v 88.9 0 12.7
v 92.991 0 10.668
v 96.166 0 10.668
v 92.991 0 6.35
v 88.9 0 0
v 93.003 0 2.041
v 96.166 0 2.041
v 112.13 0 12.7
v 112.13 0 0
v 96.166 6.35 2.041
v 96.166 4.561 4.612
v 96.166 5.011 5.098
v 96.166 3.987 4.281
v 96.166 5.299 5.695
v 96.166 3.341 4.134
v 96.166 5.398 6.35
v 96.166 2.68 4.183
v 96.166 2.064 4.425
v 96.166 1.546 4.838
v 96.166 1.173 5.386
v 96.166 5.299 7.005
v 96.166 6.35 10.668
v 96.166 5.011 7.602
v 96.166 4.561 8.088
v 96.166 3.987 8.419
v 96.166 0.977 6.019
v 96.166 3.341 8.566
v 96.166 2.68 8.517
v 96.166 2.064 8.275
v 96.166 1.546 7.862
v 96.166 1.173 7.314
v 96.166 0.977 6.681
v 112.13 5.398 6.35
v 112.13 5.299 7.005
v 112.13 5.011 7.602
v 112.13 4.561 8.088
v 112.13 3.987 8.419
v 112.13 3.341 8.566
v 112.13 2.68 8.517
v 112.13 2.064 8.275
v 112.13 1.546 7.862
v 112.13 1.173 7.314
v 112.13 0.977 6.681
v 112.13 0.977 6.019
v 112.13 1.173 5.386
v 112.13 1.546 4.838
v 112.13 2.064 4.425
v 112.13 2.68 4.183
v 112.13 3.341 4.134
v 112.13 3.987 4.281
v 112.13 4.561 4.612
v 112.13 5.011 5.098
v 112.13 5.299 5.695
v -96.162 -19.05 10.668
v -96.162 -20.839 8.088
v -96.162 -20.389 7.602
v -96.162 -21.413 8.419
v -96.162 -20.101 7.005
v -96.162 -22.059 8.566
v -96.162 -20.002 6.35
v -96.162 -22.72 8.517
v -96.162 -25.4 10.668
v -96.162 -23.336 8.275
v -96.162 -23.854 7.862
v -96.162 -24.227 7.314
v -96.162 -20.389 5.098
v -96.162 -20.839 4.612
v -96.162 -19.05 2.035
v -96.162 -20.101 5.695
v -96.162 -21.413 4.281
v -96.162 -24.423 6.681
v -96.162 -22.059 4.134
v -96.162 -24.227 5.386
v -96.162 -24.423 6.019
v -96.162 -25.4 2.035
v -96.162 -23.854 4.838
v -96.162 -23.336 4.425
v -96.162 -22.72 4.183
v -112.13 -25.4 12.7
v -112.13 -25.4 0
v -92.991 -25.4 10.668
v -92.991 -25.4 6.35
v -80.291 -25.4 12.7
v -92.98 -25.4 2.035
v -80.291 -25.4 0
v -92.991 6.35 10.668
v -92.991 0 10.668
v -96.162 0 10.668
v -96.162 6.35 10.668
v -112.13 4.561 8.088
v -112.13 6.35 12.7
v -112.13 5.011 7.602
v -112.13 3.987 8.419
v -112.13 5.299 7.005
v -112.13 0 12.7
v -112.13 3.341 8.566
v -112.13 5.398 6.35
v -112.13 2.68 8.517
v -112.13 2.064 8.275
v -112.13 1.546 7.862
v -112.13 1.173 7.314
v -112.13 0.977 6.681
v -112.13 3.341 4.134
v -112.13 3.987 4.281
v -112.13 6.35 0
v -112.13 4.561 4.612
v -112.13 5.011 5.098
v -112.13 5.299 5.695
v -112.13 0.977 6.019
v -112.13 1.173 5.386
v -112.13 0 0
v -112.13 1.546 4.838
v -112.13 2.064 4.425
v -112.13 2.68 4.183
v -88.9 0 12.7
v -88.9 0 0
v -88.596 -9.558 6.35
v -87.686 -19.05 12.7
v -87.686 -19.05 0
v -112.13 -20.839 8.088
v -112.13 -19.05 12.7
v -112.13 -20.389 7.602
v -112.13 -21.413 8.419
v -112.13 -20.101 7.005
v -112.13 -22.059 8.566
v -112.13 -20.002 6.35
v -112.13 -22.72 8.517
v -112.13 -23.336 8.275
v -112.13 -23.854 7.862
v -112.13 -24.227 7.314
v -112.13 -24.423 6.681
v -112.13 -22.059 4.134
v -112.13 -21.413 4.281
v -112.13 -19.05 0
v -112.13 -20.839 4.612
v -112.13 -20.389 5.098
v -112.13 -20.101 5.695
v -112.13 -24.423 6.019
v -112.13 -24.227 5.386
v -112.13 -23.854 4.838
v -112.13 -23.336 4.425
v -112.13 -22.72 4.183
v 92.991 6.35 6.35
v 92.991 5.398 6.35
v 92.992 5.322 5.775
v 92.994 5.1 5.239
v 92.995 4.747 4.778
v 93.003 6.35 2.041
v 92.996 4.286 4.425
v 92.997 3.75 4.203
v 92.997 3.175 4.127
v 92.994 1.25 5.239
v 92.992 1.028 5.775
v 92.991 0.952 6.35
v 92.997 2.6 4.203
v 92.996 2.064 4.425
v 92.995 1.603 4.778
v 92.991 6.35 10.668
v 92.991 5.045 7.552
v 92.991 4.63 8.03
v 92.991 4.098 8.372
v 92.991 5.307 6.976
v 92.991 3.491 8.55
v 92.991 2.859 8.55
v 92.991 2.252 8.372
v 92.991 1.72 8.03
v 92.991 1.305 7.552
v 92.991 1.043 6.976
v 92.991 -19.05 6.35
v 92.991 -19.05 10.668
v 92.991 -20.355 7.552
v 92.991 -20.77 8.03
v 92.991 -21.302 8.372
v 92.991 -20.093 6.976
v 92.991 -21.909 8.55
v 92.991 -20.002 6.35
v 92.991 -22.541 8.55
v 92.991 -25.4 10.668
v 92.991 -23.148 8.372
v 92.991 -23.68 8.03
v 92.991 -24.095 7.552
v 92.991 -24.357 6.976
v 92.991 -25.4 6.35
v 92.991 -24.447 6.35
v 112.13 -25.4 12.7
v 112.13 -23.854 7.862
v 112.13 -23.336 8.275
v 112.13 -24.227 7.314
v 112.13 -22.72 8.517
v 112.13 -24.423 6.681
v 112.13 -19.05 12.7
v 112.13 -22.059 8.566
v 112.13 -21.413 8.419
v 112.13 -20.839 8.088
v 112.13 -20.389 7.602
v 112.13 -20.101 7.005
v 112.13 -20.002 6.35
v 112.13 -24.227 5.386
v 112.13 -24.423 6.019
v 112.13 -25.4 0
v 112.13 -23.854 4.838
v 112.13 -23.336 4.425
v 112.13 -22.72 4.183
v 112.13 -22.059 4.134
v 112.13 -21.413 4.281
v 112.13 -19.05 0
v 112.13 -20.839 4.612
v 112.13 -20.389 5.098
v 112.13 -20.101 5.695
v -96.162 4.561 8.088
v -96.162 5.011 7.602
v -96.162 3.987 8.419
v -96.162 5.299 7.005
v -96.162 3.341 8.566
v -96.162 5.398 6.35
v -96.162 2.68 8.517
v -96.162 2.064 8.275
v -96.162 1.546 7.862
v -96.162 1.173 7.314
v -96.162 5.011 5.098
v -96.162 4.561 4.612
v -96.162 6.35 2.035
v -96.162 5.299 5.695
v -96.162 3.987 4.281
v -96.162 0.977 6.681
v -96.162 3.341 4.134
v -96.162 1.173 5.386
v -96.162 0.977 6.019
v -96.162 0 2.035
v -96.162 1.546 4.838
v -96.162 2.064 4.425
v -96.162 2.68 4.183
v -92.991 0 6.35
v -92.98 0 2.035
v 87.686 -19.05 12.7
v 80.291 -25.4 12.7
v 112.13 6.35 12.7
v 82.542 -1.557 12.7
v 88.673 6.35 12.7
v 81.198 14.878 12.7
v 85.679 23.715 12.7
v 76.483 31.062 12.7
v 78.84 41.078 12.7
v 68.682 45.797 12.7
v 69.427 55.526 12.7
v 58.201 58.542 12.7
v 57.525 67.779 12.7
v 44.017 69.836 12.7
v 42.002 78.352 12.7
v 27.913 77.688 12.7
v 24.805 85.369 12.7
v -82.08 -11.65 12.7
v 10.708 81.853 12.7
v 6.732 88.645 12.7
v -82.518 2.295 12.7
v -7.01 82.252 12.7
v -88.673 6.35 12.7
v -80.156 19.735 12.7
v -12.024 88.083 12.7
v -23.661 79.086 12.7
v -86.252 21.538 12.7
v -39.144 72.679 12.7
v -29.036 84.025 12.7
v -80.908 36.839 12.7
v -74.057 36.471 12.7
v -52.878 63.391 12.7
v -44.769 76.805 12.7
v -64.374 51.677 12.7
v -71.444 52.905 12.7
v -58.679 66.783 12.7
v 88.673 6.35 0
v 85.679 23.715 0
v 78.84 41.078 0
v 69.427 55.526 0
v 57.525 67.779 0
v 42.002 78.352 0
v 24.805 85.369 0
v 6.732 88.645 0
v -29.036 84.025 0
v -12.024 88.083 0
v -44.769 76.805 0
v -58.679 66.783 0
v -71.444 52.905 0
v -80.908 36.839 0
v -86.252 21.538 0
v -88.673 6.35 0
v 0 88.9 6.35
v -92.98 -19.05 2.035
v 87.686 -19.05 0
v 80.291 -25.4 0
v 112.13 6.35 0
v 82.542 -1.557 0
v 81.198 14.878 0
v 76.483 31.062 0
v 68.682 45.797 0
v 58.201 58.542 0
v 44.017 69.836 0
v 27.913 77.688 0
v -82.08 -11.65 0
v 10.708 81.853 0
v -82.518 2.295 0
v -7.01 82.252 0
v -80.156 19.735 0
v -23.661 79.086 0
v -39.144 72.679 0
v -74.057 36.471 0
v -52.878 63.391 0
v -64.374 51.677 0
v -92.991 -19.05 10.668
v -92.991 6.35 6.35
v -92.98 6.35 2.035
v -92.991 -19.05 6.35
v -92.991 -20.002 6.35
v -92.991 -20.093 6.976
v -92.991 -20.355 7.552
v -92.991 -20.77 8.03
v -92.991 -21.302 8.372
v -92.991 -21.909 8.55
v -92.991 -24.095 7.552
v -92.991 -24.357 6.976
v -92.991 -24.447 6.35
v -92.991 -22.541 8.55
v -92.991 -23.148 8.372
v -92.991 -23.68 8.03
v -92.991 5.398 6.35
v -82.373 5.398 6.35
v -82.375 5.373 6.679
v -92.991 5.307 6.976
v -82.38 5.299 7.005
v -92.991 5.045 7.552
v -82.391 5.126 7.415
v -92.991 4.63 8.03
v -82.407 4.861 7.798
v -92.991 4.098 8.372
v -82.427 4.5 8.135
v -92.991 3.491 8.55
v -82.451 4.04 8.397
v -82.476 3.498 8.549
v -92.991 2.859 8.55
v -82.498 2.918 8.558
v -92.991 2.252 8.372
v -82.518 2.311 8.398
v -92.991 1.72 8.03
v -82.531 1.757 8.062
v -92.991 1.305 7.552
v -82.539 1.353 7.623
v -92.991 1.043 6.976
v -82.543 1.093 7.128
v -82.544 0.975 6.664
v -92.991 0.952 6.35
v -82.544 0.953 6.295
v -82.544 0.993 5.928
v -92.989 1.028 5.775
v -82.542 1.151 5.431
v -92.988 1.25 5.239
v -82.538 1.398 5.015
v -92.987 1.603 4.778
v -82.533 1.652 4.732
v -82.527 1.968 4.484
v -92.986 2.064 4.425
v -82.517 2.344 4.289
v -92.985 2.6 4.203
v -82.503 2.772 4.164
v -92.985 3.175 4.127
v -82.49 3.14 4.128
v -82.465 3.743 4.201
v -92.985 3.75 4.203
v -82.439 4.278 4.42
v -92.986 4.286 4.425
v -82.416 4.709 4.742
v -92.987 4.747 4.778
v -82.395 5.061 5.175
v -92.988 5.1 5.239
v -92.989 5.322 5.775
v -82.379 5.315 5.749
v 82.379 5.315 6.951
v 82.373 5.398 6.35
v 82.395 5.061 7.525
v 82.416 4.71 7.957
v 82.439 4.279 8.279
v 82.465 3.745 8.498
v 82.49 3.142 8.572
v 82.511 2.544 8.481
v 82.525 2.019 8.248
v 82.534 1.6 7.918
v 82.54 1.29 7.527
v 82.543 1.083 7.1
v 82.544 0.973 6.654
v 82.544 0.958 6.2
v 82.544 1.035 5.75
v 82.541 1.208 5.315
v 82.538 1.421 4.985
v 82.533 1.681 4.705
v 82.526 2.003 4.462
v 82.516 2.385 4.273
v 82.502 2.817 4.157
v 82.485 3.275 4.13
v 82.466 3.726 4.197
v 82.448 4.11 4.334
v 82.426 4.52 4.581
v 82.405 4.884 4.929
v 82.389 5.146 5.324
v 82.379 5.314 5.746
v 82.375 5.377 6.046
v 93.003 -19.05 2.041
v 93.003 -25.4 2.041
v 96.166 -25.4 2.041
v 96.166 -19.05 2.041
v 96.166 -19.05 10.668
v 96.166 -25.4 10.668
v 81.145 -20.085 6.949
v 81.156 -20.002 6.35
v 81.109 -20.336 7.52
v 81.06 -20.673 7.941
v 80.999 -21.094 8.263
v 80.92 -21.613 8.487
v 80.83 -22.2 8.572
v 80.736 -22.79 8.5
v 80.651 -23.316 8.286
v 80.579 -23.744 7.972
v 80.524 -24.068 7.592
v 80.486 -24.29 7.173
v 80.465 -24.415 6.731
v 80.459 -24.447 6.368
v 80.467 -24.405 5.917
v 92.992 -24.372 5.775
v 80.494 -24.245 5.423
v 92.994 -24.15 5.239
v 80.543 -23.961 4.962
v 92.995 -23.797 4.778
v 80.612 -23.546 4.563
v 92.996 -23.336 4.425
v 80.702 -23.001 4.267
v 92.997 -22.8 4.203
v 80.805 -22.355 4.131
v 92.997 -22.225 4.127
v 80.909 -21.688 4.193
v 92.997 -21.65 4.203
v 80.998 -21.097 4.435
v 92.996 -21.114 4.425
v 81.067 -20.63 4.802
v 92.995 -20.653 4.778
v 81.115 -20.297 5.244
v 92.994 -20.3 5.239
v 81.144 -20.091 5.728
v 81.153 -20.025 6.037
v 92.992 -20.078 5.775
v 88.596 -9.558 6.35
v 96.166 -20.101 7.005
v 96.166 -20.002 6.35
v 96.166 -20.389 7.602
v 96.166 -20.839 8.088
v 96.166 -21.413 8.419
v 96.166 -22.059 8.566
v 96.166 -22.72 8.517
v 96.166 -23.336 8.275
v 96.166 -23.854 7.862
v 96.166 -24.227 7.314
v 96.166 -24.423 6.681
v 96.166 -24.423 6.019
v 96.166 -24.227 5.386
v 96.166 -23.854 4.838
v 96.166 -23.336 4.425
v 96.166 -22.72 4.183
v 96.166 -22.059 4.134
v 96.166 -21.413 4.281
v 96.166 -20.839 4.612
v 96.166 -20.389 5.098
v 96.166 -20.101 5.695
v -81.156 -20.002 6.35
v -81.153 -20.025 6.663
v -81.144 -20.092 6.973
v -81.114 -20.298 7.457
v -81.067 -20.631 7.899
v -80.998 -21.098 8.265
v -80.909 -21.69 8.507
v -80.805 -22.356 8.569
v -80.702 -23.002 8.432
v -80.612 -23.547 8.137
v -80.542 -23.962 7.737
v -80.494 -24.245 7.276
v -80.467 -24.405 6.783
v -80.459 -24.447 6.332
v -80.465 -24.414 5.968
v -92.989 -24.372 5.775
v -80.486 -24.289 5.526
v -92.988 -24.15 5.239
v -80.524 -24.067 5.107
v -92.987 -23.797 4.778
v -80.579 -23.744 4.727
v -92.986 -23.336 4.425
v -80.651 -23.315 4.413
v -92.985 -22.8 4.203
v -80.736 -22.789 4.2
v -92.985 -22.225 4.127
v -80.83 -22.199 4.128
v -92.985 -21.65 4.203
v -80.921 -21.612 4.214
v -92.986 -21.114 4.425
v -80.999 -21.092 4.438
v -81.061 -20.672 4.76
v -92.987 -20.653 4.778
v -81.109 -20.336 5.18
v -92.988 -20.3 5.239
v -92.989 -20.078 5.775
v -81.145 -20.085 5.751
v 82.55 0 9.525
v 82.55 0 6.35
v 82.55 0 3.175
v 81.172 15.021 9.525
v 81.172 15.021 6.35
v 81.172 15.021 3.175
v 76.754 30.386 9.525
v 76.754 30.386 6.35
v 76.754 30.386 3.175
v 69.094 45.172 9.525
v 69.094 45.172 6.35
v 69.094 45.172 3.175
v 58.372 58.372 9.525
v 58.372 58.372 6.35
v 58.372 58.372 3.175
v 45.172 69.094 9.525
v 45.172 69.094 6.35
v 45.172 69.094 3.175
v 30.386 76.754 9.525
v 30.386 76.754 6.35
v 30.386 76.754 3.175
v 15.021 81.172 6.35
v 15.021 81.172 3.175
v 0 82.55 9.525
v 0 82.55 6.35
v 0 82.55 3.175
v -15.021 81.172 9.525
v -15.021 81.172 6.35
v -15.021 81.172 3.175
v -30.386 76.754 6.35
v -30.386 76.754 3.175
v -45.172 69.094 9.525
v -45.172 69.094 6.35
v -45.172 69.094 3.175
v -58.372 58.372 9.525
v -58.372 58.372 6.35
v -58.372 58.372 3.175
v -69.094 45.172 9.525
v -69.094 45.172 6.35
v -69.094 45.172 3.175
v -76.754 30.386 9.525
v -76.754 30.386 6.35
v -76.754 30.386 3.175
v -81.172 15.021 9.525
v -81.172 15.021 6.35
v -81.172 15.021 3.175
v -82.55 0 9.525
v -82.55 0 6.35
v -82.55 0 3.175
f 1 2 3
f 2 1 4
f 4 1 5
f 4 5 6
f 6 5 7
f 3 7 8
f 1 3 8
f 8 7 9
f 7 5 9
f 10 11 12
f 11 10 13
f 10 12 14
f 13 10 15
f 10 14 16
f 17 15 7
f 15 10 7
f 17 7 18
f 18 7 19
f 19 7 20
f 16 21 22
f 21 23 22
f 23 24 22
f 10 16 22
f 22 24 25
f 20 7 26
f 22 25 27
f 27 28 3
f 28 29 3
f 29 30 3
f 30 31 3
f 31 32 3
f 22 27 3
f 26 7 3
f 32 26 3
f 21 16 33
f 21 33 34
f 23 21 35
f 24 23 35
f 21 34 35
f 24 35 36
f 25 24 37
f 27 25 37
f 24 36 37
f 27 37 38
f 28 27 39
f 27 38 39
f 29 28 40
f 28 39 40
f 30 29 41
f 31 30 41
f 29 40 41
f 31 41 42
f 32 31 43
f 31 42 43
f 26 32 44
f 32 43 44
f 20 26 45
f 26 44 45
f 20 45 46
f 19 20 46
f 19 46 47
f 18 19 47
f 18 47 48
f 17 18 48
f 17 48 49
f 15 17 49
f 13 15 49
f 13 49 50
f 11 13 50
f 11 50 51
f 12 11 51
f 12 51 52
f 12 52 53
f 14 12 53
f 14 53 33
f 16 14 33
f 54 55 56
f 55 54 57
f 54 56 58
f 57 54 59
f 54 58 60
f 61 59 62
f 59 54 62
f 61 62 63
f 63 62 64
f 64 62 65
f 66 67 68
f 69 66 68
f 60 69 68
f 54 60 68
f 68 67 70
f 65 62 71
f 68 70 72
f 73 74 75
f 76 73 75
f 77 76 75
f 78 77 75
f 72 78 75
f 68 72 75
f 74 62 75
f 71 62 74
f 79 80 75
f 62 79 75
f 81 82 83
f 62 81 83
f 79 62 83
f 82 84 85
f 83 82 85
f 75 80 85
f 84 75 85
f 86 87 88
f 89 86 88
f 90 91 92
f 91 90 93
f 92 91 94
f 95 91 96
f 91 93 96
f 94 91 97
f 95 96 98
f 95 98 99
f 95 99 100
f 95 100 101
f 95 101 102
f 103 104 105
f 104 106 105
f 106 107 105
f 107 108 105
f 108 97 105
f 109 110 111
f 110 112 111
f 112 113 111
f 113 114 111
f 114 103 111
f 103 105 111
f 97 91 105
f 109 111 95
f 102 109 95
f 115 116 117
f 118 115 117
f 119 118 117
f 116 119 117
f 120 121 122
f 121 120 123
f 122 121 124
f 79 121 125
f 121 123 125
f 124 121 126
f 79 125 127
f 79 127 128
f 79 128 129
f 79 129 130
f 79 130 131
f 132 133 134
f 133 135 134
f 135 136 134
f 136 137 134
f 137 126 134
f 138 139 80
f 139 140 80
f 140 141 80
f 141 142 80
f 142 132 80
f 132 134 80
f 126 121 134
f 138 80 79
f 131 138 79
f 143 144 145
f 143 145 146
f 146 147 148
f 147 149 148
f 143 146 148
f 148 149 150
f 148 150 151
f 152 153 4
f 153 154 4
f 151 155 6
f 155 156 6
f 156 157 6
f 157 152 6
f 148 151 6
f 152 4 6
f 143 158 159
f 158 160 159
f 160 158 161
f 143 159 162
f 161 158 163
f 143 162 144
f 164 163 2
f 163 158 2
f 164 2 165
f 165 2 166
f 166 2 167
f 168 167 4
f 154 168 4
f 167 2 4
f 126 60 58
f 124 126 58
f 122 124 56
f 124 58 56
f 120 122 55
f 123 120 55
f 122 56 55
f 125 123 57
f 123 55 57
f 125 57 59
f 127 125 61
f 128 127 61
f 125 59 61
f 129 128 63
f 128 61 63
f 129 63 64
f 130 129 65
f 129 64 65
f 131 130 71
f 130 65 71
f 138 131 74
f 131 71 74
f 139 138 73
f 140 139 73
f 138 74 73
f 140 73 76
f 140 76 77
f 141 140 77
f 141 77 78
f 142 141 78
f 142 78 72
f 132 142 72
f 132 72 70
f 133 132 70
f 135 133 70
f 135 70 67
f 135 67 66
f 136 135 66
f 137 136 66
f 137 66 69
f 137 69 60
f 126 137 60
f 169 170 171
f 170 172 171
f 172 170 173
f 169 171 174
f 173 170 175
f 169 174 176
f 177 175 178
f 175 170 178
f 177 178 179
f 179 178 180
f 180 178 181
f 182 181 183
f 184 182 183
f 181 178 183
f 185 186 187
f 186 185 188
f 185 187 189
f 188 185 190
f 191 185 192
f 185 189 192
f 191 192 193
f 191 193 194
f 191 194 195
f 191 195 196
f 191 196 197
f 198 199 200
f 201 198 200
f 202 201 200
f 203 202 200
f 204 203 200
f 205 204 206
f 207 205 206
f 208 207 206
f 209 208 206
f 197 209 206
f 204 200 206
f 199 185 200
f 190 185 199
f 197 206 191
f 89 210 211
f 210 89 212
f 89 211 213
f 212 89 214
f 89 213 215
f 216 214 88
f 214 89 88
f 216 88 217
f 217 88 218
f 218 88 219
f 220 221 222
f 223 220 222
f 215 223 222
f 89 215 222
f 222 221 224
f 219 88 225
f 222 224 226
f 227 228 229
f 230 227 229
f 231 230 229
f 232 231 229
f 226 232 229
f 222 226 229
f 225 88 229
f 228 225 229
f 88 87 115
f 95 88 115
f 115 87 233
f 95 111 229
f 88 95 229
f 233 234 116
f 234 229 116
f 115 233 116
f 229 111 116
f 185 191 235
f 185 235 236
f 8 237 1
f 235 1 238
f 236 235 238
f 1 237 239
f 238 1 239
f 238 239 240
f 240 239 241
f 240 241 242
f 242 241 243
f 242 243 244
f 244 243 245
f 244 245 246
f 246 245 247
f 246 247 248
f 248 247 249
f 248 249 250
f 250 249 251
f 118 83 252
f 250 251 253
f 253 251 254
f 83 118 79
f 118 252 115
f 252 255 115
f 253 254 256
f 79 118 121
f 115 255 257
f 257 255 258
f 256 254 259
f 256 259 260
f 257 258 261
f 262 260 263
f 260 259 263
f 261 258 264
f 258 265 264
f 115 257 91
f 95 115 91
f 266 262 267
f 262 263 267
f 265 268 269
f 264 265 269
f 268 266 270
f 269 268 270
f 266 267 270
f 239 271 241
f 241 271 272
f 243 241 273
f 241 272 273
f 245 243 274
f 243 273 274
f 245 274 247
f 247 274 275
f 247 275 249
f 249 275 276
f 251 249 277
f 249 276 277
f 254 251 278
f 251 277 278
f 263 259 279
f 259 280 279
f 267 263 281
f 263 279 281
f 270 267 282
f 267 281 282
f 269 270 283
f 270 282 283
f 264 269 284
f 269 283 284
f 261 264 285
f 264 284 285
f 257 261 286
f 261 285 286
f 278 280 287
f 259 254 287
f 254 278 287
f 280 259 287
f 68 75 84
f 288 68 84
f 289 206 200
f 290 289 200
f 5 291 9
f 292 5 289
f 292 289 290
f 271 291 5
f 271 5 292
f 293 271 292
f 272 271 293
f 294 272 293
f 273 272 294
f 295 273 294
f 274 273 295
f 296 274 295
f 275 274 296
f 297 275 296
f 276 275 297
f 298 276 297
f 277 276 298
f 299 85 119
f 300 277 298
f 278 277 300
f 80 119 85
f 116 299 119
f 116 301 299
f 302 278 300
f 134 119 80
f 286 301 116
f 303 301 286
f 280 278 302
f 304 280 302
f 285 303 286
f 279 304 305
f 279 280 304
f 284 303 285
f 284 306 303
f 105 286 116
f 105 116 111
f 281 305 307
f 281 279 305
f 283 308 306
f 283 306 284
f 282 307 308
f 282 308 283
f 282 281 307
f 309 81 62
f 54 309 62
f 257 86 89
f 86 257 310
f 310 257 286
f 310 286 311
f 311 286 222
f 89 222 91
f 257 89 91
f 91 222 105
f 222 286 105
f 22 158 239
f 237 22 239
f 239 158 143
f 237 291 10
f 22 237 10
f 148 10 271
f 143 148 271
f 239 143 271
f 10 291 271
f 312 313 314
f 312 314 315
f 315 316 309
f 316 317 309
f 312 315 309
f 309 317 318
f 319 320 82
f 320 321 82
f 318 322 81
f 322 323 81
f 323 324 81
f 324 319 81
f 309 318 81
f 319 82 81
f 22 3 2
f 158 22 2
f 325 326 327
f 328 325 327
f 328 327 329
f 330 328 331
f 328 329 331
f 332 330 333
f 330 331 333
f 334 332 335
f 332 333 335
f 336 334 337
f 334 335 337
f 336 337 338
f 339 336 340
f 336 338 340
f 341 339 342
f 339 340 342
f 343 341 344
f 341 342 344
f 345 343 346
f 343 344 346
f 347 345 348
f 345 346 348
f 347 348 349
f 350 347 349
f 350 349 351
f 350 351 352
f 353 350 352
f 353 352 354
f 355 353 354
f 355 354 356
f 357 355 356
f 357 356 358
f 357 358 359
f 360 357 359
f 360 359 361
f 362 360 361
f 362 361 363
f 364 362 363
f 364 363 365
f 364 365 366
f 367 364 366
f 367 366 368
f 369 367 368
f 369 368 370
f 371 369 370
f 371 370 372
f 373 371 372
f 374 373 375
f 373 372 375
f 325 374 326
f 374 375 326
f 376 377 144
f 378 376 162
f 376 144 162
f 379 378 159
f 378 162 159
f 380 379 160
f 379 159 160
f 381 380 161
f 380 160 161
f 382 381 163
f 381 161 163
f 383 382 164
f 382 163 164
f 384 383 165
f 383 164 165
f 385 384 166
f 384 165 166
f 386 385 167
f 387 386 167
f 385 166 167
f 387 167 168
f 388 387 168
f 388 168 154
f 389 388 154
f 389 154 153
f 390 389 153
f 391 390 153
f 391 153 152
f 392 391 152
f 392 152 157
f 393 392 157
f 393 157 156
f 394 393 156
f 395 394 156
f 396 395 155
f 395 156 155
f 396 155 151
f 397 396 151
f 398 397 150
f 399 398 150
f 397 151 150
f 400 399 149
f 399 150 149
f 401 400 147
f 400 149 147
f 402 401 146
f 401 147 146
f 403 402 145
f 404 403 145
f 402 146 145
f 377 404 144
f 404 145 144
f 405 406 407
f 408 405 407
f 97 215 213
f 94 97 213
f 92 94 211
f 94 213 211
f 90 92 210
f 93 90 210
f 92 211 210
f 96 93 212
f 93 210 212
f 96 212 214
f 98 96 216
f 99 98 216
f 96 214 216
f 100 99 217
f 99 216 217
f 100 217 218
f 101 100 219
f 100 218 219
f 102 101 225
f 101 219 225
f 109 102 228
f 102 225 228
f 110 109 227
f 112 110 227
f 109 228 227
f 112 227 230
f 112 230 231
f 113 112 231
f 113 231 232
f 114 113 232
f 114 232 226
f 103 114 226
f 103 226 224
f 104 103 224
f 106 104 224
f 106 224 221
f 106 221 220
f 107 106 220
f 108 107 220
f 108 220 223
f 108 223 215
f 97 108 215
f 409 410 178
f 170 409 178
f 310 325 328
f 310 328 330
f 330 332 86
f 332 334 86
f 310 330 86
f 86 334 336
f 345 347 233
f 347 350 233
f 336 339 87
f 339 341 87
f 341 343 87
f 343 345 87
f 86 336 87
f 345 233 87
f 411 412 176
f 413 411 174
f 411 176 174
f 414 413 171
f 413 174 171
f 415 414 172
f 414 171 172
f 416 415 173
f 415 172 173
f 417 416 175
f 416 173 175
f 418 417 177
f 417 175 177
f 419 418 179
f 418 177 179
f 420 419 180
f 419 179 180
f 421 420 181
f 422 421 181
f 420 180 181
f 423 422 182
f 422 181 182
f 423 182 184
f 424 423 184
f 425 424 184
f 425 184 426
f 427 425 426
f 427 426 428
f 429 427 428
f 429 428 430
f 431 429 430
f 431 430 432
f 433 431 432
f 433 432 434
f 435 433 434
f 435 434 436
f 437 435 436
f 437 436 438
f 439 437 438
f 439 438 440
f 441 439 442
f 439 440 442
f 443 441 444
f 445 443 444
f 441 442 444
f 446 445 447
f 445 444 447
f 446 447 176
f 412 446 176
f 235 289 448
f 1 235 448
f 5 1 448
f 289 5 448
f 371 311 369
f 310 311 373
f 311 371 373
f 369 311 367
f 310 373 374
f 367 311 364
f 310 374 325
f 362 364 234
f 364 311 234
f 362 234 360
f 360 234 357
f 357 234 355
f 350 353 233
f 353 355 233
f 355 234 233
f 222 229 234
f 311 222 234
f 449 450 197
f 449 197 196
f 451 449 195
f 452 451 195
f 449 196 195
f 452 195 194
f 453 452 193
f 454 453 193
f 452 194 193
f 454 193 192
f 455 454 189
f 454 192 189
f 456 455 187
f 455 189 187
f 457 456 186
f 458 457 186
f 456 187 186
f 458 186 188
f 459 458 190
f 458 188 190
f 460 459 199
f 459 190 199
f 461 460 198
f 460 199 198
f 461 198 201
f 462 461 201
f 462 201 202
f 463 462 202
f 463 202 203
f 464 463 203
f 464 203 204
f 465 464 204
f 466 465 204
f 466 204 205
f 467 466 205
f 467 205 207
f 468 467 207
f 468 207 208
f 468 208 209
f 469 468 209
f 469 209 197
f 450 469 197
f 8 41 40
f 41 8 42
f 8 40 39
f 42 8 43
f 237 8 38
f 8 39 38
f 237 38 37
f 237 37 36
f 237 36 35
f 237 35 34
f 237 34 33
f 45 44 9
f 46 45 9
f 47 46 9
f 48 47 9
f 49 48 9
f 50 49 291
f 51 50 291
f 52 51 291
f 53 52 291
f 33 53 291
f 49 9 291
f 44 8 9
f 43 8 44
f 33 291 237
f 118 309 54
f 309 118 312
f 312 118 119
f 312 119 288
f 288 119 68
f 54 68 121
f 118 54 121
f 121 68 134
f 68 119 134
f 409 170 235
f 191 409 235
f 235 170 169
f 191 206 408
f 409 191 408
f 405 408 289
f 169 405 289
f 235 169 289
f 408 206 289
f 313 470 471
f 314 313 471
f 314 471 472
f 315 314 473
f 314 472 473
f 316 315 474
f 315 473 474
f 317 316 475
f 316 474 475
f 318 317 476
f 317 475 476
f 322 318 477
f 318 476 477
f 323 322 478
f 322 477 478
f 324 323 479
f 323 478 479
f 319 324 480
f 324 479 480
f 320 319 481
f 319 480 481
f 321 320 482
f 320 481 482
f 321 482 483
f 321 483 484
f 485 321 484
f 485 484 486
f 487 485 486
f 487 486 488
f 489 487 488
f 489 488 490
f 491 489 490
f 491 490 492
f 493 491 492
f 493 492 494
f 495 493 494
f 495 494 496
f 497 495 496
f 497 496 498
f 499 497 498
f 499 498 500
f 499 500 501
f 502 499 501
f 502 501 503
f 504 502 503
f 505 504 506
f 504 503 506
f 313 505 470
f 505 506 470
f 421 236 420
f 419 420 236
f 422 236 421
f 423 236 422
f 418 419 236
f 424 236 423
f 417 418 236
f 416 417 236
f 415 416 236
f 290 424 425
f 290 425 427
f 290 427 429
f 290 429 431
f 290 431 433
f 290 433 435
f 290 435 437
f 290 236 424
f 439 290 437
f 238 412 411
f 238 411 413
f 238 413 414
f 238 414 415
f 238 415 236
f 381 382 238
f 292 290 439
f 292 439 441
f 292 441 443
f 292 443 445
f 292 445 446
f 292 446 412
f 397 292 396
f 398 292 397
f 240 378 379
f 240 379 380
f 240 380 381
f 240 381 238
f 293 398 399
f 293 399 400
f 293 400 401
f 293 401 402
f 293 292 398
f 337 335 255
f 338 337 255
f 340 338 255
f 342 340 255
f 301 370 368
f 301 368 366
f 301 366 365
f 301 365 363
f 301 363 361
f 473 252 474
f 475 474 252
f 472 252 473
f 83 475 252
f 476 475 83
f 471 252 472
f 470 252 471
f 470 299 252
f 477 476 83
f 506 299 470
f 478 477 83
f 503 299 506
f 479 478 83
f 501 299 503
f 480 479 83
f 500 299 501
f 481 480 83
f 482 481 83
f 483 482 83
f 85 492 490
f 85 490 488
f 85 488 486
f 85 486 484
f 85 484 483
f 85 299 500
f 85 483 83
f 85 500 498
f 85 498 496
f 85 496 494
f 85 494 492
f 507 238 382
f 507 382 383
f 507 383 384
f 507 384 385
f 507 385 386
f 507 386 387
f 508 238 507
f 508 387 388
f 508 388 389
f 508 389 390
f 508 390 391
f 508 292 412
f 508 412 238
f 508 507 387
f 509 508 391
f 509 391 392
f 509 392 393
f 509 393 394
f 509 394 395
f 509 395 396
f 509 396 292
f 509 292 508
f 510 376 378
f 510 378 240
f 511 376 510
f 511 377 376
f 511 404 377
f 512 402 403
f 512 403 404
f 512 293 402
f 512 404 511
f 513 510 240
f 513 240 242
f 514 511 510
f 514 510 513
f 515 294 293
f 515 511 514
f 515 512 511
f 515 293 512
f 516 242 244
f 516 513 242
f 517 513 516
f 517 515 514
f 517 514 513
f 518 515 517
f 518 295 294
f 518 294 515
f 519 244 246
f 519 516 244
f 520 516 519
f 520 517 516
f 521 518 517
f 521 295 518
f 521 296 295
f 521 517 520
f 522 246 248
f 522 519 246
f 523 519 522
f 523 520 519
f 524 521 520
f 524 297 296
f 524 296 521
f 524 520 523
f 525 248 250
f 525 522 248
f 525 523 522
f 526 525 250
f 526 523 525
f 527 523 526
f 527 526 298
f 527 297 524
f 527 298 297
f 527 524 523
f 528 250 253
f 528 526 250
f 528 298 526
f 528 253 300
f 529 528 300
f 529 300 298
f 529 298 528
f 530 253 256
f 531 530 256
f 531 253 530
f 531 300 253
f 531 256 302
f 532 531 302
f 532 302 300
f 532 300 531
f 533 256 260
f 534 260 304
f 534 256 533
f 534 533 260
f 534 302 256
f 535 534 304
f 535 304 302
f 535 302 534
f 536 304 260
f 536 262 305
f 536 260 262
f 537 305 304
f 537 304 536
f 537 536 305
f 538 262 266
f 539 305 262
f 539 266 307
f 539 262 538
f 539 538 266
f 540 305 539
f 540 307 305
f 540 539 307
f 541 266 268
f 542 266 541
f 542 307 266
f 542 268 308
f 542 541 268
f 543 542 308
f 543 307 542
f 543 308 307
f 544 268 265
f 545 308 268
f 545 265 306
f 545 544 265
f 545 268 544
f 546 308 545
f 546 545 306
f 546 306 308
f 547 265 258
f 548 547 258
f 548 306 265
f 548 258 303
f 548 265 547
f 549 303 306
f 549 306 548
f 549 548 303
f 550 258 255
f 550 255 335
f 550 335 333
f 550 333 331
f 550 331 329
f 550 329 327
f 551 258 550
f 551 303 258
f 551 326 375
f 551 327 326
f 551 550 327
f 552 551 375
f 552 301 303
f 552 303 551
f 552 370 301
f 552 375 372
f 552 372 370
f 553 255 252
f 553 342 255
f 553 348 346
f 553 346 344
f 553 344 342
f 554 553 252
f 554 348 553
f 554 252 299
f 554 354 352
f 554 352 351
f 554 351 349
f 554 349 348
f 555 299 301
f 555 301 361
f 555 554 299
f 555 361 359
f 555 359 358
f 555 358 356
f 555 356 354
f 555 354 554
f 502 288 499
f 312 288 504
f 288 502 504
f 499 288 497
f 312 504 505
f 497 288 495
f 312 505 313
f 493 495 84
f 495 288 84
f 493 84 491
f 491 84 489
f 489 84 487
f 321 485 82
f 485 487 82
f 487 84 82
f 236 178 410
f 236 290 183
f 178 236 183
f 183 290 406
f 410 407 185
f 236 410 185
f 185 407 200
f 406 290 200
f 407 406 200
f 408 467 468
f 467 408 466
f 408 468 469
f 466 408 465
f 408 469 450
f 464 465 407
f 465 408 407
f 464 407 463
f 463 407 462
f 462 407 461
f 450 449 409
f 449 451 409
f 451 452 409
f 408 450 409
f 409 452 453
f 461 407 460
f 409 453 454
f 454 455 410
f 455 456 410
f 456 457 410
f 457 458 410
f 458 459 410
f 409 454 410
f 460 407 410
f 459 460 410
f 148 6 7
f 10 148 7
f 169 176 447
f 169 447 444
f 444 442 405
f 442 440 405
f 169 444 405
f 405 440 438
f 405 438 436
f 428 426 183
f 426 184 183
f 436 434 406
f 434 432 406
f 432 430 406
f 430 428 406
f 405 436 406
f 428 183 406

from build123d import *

# Parameters (mm, degrees)
F1_DEPTH = 12.7
F2_R     = 2.2225
F3_DEPTH = 224.2610175194
F5_DEPTH = 114.3010001
F7_DEPTH = 114.3010001


with BuildPart() as f1:
    # F0 (on Top) → F1 (new body)
    with BuildSketch(Plane.XY):
        with BuildLine():
            add(Edge.make_bspline(
                [(82.55, 0), (82.55, 82.55), (0, 82.55), (-82.55, 82.55), (-82.55, 0)],
                knots=[3.1415926536, 3.1415926536, 3.1415926536, 4.7123889804, 4.7123889804, 6.2831853072, 6.2831853072, 6.2831853072], degree=2, weights=[1, 0.7071067812, 1, 0.7071067812, 1]))
            add(Edge.make_bspline(
                [(80.2907301186, -25.4), (82.55, -12.876201172), (82.55, 0)],
                knots=[1.3363000119, 1.3363000119, 1.3363000119, 1.5707963268, 1.5707963268, 1.5707963268], degree=2, weights=[1, 0.9931343055, 1]))
            Line((80.2907301186, -25.4), (86.7300087097, -25.4))
            Line((86.7300087097, -25.4), (112.1300087097, -25.4))
            Line((112.1300087097, -25.4), (112.1300087097, -19.05))
            Line((112.1300087097, -19.05), (87.6859879403, -19.05))
            add(Edge.make_bspline(
                [(87.6859879403, -19.05), (88.9, -9.5904834792), (88.9, 0)],
                knots=[1.4053446837, 1.4053446837, 1.4053446837, 1.5707963268, 1.5707963268, 1.5707963268], degree=2, weights=[1, 0.9965801702, 1]))
            Line((88.9, 0), (112.1300087097, 0))
            Line((112.1300087097, 0), (112.1300087097, 6.35))
            Line((112.1300087097, 6.35), (88.6729242779, 6.35))
            add(Edge.make_bspline(
                [(88.6729242779, 6.35), (82.7613959927, 88.9), (0, 88.9), (-82.7613959927, 88.9), (-88.6729242779, 6.35)],
                knots=[3.2130821035, 3.2130821035, 3.2130821035, 4.7123889804, 4.7123889804, 6.2116958573, 6.2116958573, 6.2116958573], degree=2, weights=[1, 0.7319250547, 1, 0.7319250547, 1]))
            Line((-88.6729242779, 6.35), (-112.1300087097, 6.35))
            Line((-112.1300087097, 6.35), (-112.1300087097, 0))
            Line((-112.1300087097, 0), (-88.9, 0))
            add(Edge.make_bspline(
                [(-88.9, 0), (-88.9, -9.5904834792), (-87.6859879403, -19.05)],
                knots=[4.7123889804, 4.7123889804, 4.7123889804, 4.8778406234, 4.8778406234, 4.8778406234], degree=2, weights=[1, 0.9965801702, 1]))
            Line((-87.6859879403, -19.05), (-112.1300087097, -19.05))
            Line((-112.1300087097, -19.05), (-112.1300087097, -25.4))
            Line((-112.1300087097, -25.4), (-86.7300087097, -25.4))
            Line((-86.7300087097, -25.4), (-80.2907301186, -25.4))
            add(Edge.make_bspline(
                [(-82.55, 0), (-82.55, -12.876201172), (-80.2907301186, -25.4)],
                knots=[4.7123889804, 4.7123889804, 4.7123889804, 4.9468852953, 4.9468852953, 4.9468852953], degree=2, weights=[1, 0.9931343055, 1]))
        make_face()
    extrude(amount=F1_DEPTH)

    # F2 (on face) → F3 (cut, through all)
    with BuildSketch(Plane.YZ.offset(112.1300087097)):
        with Locations((-22.225, 6.35)):
            Circle(F2_R)
        with Locations((3.175, 6.35)):
            Circle(F2_R)
    extrude(amount=-F3_DEPTH, mode=Mode.SUBTRACT)

    # F4 (on face) → F5 (cut, through all)
    with BuildSketch(Plane.XZ.offset(25.4)):
        Polygon((-92.9797930479, 2.0354613662), (-92.9907301186, 6.35), (-92.9907301186, 10.668), (-96.1623830557, 10.668), (-96.1623830557, 2.0354613662), align=None)
    extrude(amount=-F5_DEPTH, mode=Mode.SUBTRACT)

    # F6 (on face) → F7 (cut, through all)
    with BuildSketch(Plane.XZ.offset(25.4)):
        Polygon((92.9907301186, 10.668), (92.9907301186, 6.35), (93.0033624172, 2.0407887641), (96.1657301186, 2.0407887641), (96.1657301186, 10.668), align=None)
    extrude(amount=-F7_DEPTH, mode=Mode.SUBTRACT)


solid = f1.part
